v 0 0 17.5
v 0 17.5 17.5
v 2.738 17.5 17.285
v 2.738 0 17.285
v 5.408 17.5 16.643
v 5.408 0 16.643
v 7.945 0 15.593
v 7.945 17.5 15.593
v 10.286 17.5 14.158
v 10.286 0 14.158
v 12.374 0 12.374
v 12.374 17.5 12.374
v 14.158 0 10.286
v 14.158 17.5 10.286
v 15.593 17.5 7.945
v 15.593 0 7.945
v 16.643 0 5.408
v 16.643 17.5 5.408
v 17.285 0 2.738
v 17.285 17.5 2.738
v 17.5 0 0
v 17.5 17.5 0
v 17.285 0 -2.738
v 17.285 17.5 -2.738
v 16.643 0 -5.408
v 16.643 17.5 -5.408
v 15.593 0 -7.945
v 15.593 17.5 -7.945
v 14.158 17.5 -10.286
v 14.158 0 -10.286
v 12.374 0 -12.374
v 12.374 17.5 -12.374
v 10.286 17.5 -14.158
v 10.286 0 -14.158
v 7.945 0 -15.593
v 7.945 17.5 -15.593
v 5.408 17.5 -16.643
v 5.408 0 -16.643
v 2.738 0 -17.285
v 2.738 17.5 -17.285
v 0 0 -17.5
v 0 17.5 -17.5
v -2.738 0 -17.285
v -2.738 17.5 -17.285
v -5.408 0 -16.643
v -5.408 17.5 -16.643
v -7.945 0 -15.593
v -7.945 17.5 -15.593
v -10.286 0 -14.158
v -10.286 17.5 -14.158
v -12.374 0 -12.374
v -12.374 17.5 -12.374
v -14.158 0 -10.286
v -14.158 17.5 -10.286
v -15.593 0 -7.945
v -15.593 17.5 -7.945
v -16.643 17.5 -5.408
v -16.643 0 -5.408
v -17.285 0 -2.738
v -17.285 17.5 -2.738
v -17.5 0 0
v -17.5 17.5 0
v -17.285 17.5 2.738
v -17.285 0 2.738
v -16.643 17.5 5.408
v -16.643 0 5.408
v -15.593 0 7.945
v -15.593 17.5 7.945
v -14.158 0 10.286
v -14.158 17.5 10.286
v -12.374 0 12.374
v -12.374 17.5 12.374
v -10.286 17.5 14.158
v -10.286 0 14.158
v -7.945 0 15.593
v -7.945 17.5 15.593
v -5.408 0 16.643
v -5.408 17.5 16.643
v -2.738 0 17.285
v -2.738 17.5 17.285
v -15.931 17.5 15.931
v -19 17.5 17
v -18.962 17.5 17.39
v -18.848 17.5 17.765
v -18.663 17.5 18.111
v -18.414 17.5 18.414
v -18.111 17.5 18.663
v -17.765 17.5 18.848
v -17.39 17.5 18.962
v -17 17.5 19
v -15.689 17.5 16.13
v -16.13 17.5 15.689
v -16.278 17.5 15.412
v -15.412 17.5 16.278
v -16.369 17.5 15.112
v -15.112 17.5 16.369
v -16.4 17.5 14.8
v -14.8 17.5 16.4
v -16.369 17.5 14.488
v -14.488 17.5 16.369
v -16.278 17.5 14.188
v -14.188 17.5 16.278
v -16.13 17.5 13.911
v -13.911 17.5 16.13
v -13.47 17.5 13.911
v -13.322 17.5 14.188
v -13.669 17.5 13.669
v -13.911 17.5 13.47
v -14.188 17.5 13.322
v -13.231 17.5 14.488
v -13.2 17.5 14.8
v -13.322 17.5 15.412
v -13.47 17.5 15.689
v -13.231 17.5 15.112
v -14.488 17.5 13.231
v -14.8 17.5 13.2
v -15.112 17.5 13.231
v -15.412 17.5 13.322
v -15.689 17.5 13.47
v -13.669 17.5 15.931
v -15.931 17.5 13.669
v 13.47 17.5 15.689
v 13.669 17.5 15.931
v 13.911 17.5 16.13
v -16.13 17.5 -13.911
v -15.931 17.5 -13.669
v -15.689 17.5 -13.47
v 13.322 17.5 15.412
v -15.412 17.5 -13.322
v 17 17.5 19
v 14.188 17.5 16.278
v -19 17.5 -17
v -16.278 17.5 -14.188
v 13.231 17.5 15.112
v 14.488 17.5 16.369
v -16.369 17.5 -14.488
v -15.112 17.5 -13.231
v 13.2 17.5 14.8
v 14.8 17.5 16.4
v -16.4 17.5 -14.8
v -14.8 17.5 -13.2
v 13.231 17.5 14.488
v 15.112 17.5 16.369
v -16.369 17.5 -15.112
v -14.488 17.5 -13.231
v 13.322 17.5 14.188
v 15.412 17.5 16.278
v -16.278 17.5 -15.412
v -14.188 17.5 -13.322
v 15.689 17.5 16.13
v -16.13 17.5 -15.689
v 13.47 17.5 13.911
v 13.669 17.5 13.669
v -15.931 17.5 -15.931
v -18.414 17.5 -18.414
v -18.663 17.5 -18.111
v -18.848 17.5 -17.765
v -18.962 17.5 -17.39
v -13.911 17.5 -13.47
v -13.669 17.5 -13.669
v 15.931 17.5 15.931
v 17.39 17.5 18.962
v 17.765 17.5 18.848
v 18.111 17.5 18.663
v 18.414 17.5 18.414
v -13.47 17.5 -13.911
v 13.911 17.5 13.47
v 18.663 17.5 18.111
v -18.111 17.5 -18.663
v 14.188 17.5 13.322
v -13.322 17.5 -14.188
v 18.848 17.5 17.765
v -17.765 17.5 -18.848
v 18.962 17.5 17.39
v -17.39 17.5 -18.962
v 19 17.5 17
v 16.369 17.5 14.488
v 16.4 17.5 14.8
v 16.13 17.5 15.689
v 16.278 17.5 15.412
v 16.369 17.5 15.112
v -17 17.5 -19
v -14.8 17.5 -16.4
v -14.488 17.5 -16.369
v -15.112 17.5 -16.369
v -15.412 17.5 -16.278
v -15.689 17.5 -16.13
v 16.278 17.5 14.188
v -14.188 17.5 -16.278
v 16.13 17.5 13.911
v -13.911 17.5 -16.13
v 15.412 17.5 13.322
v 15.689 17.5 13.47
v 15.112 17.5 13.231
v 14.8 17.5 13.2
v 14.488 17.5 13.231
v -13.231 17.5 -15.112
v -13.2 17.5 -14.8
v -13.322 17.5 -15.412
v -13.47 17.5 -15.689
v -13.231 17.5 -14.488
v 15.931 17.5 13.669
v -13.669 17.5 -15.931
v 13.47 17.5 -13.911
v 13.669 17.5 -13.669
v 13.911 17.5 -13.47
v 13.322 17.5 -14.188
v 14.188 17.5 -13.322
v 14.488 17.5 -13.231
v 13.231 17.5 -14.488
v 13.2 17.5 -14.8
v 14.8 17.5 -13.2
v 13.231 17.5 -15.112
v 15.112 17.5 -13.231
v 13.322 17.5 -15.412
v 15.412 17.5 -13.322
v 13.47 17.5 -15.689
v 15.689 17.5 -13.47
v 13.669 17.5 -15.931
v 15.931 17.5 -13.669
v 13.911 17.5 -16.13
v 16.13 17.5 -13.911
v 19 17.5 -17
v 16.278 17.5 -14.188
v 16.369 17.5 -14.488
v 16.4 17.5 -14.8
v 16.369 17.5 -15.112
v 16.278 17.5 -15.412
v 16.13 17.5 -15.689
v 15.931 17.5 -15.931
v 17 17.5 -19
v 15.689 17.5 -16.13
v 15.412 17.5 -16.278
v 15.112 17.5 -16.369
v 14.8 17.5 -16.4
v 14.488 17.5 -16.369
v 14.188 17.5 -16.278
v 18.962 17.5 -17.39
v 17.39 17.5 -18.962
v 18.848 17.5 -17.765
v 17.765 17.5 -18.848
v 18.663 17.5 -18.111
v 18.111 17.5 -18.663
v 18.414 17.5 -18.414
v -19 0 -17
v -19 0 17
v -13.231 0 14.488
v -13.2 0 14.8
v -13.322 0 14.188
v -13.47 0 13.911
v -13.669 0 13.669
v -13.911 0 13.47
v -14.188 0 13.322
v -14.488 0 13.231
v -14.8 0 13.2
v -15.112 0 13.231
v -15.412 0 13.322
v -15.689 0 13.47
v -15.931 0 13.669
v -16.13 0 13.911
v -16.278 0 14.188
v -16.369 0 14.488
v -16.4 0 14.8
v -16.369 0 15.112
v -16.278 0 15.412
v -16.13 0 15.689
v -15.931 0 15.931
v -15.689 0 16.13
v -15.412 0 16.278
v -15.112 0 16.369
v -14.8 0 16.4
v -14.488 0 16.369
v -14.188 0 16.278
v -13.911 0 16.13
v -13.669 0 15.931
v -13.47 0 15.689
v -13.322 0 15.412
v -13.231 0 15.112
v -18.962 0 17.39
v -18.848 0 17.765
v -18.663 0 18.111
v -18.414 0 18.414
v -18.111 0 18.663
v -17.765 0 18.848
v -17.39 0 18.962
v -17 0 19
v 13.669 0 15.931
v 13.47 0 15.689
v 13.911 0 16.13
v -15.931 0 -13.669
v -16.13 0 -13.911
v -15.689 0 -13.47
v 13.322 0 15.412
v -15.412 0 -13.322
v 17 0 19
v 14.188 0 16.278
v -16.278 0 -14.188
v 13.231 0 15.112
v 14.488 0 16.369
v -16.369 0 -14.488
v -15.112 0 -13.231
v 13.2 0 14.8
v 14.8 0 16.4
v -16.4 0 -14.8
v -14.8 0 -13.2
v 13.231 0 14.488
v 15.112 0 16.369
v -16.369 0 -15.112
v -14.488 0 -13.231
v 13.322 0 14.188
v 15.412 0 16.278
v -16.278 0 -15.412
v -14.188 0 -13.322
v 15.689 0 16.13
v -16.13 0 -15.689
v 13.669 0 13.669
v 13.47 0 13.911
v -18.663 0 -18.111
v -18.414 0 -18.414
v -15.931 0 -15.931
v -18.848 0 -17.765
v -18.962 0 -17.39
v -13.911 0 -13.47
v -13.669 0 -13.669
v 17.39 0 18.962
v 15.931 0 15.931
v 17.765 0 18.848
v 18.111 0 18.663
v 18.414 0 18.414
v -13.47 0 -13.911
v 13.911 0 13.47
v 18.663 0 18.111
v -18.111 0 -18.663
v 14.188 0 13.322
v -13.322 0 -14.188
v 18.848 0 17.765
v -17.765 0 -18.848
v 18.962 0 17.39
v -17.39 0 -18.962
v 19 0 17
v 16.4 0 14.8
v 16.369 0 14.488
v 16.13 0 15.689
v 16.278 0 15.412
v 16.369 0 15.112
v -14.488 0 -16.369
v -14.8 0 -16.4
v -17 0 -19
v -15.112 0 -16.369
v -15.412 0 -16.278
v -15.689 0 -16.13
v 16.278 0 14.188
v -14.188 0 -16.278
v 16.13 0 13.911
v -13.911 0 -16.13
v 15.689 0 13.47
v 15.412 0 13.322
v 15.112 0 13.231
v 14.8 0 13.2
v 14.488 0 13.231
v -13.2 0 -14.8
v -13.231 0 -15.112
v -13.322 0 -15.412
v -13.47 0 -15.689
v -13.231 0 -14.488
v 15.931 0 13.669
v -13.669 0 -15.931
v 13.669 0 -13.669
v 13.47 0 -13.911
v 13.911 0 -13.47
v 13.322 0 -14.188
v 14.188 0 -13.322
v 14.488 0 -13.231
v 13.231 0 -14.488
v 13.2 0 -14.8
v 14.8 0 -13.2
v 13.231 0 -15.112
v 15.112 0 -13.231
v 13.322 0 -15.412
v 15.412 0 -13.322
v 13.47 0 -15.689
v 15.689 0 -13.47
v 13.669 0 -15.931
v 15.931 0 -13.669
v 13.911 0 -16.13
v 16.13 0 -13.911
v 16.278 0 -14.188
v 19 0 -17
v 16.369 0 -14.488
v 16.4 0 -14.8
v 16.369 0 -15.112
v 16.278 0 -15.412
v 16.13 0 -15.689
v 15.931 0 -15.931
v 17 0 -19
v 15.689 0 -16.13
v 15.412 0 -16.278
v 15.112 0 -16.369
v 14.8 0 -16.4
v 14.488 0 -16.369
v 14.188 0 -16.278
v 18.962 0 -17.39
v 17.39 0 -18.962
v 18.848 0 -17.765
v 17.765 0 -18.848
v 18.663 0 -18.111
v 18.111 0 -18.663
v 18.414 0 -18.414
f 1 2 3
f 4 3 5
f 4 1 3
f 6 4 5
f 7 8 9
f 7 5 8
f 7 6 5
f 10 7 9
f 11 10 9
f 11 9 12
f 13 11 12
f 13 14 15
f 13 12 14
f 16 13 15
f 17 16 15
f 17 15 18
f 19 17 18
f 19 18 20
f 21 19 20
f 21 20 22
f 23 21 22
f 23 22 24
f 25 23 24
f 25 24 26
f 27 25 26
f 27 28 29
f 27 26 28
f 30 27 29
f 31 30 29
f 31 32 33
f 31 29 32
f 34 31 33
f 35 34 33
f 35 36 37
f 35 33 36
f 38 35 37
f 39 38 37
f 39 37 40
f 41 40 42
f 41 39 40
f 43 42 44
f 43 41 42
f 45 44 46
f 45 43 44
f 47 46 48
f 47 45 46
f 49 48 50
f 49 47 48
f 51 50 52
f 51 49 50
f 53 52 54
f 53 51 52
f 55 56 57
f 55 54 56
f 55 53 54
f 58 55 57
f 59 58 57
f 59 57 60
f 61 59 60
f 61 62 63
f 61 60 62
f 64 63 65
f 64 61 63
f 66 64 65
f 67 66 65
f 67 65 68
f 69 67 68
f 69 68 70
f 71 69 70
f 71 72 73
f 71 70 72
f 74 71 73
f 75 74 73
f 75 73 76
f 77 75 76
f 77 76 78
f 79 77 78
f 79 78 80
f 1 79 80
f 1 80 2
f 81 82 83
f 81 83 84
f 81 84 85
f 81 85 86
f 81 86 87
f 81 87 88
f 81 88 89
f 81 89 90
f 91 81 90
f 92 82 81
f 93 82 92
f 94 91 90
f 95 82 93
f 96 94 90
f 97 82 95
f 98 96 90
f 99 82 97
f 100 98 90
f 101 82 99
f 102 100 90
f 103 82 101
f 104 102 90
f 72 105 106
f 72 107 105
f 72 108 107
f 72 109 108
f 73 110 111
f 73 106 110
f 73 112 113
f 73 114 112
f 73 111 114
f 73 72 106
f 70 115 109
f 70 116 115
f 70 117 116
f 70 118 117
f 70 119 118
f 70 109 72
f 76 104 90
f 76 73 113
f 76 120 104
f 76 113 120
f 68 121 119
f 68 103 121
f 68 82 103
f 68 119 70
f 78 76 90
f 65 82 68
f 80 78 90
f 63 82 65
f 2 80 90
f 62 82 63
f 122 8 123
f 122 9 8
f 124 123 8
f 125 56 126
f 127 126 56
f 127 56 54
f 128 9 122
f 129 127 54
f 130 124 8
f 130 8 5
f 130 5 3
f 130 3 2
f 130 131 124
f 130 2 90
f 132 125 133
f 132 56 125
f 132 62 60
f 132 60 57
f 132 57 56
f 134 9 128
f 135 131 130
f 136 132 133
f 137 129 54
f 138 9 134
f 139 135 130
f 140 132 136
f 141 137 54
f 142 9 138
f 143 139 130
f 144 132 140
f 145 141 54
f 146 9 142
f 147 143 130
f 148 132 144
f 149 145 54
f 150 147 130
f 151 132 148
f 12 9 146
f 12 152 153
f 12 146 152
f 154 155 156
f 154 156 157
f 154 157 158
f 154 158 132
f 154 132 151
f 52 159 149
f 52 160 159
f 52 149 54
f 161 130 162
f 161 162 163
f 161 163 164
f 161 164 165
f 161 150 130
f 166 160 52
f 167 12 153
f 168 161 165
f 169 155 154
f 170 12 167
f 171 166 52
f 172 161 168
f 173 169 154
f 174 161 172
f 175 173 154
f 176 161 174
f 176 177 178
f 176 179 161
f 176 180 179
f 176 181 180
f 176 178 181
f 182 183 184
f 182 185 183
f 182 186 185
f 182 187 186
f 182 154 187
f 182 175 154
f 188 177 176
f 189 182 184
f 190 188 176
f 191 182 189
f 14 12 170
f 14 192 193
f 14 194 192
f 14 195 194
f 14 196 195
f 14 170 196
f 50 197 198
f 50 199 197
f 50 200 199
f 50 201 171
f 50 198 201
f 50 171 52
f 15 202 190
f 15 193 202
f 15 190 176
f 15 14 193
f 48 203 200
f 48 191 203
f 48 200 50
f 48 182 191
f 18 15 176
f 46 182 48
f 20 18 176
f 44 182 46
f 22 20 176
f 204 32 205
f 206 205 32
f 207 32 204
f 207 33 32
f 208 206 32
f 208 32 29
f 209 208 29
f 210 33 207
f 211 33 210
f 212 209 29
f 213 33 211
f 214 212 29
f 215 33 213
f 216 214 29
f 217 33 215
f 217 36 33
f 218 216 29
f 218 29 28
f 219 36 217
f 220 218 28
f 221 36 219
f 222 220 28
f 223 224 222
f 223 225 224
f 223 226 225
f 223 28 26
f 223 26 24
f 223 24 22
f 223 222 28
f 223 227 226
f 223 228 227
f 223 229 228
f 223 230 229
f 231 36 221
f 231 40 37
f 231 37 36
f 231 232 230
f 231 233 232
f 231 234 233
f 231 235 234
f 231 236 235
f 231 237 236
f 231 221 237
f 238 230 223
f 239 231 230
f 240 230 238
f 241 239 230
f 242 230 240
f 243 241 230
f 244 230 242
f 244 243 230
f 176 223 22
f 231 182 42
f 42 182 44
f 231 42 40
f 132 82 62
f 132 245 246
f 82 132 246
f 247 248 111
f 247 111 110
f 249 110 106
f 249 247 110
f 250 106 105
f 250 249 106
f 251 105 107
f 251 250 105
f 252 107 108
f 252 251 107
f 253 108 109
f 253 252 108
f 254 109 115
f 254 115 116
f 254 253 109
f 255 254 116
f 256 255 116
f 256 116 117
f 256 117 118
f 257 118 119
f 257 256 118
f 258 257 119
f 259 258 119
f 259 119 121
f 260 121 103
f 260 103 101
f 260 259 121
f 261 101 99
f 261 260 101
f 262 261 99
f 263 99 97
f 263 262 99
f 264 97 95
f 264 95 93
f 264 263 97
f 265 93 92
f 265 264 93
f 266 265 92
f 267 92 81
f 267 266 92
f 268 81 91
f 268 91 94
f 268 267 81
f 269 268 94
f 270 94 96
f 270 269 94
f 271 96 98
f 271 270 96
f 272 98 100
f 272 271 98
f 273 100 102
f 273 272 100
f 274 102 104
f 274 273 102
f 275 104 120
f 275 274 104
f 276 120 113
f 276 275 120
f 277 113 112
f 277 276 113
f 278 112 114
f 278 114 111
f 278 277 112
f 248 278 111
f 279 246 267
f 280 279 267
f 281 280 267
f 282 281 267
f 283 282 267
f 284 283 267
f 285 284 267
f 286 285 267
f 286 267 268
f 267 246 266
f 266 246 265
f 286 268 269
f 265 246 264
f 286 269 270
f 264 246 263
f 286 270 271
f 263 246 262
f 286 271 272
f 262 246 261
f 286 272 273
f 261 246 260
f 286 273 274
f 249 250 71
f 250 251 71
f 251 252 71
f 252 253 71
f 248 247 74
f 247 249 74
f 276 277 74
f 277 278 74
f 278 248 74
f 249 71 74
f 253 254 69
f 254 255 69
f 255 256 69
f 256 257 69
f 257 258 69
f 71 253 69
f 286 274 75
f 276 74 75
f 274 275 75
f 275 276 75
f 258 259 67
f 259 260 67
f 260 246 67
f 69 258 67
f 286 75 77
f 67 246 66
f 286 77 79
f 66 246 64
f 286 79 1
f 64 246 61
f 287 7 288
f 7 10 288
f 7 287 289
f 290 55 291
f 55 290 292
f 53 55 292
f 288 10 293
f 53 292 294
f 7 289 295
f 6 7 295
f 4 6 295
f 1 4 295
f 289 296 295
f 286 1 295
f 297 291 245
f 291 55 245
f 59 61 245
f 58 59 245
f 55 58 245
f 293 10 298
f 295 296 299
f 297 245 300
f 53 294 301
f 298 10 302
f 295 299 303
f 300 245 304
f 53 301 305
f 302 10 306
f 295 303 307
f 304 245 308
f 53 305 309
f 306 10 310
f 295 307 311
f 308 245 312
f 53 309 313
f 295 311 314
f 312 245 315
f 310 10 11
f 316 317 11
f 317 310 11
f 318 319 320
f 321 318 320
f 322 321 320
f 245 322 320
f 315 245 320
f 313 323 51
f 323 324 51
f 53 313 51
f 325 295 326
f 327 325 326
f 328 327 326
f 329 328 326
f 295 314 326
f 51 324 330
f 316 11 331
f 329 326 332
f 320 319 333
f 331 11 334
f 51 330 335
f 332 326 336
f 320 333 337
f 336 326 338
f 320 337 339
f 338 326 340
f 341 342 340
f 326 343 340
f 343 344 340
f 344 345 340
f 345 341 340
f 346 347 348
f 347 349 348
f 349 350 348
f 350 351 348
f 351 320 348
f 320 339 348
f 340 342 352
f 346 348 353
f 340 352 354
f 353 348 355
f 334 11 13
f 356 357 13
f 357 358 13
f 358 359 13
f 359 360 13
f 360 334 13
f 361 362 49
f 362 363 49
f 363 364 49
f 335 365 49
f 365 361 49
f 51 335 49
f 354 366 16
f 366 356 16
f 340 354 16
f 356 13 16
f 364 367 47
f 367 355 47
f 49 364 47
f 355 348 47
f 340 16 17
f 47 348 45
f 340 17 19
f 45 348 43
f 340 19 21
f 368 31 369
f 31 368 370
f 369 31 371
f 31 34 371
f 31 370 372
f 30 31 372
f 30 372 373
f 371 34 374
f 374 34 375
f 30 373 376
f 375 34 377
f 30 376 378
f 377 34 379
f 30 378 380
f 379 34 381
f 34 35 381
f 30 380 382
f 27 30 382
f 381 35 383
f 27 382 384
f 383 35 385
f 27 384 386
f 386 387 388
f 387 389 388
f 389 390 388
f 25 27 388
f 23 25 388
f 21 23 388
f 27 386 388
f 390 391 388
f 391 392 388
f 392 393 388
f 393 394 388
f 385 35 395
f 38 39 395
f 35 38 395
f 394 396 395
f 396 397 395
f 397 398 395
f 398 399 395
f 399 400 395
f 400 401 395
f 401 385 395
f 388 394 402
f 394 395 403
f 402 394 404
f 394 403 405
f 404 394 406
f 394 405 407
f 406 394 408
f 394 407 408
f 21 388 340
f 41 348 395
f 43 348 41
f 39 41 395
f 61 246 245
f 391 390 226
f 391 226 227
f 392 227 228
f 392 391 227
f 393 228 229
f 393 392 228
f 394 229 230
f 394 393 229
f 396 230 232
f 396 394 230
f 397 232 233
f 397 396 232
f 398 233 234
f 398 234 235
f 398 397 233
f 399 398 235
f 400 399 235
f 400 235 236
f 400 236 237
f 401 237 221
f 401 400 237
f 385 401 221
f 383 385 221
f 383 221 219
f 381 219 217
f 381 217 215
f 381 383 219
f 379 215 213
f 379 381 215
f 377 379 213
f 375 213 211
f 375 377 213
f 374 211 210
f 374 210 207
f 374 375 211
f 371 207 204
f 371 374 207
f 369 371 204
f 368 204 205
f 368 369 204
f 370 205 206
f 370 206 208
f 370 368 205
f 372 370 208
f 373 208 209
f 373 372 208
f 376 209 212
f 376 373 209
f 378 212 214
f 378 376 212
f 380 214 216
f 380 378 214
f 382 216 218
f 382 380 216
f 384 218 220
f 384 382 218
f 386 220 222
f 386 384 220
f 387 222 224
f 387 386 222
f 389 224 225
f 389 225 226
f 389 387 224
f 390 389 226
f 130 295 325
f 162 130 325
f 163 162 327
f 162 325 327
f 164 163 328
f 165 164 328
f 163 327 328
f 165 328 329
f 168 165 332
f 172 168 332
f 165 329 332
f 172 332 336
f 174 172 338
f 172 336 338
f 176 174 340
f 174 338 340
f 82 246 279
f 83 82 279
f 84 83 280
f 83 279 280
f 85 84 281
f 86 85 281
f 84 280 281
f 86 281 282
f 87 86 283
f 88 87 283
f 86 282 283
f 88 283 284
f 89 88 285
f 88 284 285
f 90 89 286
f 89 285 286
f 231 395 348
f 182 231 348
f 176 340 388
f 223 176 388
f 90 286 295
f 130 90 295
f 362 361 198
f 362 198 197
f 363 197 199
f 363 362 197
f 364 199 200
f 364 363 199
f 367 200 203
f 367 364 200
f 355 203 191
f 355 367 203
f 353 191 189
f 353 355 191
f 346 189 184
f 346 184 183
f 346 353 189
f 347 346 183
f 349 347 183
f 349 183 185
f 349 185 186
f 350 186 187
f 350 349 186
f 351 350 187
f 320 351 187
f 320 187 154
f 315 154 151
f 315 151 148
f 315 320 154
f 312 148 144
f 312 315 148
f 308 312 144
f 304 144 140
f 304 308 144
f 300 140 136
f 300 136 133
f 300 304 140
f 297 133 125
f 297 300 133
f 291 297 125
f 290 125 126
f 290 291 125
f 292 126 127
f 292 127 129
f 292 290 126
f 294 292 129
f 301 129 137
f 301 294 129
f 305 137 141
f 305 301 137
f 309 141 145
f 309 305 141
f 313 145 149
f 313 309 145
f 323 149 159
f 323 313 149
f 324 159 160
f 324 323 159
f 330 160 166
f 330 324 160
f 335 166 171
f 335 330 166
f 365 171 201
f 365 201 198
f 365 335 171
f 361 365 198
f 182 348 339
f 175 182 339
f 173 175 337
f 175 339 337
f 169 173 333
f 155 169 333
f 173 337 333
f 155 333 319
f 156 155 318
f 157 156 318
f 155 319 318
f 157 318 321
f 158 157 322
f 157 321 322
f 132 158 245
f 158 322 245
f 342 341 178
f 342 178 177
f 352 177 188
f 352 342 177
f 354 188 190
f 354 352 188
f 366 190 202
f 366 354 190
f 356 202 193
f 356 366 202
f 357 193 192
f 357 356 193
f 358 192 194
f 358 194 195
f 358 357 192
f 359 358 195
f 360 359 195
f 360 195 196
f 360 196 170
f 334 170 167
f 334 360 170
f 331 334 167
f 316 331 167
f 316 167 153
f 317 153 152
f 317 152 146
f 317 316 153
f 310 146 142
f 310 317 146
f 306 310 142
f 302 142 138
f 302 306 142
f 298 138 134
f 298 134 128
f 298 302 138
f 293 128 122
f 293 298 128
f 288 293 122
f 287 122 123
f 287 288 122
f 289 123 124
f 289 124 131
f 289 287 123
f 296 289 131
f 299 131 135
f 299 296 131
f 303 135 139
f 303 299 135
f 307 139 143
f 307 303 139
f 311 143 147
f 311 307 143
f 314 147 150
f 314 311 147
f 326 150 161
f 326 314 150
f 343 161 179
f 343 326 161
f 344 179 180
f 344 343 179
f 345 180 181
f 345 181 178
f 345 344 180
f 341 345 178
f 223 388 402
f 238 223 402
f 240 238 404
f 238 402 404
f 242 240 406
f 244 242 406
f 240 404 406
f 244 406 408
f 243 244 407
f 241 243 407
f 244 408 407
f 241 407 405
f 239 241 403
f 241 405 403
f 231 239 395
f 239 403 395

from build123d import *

# Parameters (mm, degrees)
STOCK_MULTIBODY_1_OUTLINE_R   = 1.6
STOCK_MULTIBODY_1_OUTLINE_R_2 = 8.85
STOCK_MULTIBODY_1_DEPTH       = 17.5
CUT_EXTRUDE1_DEPTH            = 33.06633749
CUT_EXTRUDE1_DEPTH_BACK       = 33.06633749
SKETCH1_R                     = 17.5


# Read off the part's stored shape, not the designer's step: Stock-Multibody-1
with BuildPart() as part:
    # Stock-Multibody-1 outline → Stock-Multibody-1 (new body)
    with BuildSketch(Plane(origin=(0, 0, 0), x_dir=(1, 0, 0), z_dir=(0, 1, 0))):
        with BuildLine():
            ThreePointArc((-19, -17), (-18.414213562, -18.414213562), (-17, -19))
            Line((-17, -19), (17, -19))
            ThreePointArc((17, -19), (18.414213562, -18.414213562), (19, -17))
            Line((19, -17), (19, 17))
            ThreePointArc((19, 17), (18.414213562, 18.414213562), (17, 19))
            Line((17, 19), (-17, 19))
            ThreePointArc((-17, 19), (-18.414213562, 18.414213562), (-19, 17))
            Line((-19, 17), (-19, -17))
        make_face()
        with Locations((-14.8, -14.8)):
            Circle(STOCK_MULTIBODY_1_OUTLINE_R, mode=Mode.SUBTRACT)
        with Locations((14.8, -14.8)):
            Circle(STOCK_MULTIBODY_1_OUTLINE_R, mode=Mode.SUBTRACT)
        with Locations((-14.8, 14.8)):
            Circle(STOCK_MULTIBODY_1_OUTLINE_R, mode=Mode.SUBTRACT)
        Circle(STOCK_MULTIBODY_1_OUTLINE_R_2, mode=Mode.SUBTRACT)
        with Locations((14.8, 14.8)):
            Circle(STOCK_MULTIBODY_1_OUTLINE_R, mode=Mode.SUBTRACT)
    extrude(amount=STOCK_MULTIBODY_1_DEPTH)

    # Sketch1 → Cut-Extrude1 (cut, two sides: drawn at the far end of the back side and taken through both)
    with BuildSketch(Plane(origin=(0, 17.5, 0), x_dir=(1, 0, 0), z_dir=(0, 1, 0)).offset(-CUT_EXTRUDE1_DEPTH_BACK)):
        with Locations(Location((0, 0, 0), (0, 0, 270))):
            Circle(SKETCH1_R)
    extrude(amount=CUT_EXTRUDE1_DEPTH + CUT_EXTRUDE1_DEPTH_BACK, mode=Mode.SUBTRACT)


solid = part.part
